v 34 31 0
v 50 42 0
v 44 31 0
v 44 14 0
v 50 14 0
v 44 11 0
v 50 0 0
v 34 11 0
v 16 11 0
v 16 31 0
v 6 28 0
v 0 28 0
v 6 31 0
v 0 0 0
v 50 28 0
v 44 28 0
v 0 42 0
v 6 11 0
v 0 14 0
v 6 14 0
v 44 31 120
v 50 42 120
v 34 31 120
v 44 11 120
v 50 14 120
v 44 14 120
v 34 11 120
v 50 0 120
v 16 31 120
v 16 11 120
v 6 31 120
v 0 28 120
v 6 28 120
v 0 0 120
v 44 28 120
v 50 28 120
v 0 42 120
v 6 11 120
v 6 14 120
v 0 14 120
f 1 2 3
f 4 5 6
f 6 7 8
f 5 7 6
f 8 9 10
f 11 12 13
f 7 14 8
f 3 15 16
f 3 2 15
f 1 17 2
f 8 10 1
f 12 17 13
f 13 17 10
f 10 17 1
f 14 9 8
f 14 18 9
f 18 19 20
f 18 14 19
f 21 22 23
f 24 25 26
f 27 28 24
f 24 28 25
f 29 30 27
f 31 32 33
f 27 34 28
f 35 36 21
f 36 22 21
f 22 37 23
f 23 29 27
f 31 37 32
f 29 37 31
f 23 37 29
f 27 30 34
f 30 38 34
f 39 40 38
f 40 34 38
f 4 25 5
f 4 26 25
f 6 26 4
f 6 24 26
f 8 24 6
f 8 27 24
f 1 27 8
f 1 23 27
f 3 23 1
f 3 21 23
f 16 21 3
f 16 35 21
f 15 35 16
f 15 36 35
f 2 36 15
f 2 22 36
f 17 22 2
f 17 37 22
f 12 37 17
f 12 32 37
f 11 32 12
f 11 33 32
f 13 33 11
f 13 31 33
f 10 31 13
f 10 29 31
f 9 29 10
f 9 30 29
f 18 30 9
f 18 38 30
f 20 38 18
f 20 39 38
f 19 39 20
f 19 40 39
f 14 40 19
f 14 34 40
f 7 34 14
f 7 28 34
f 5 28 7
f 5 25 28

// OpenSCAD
$fn = 32;

// ----------------------------------------------------------------------
// T-slot rail: 50 x 42 mm section, 120 mm long
// ----------------------------------------------------------------------

// --- parameters (mm) ---
profile_height = 120;     // extrusion height
profile_points = 20;      // points of the closed outline

profile = [[0, 0], [50, 0], [50, 14], [44, 14], [44, 11], [34, 11], [34, 31], [44, 31], [44, 28], [50, 28], [50, 42], [0, 42], [0, 28], [6, 28], [6, 31], [16, 31], [16, 11], [6, 11], [6, 14], [0, 14]];  // single closed polygon, 20 points, counter clockwise

// --- the one profile operation ---
linear_extrude(height = profile_height) polygon(points = profile);
